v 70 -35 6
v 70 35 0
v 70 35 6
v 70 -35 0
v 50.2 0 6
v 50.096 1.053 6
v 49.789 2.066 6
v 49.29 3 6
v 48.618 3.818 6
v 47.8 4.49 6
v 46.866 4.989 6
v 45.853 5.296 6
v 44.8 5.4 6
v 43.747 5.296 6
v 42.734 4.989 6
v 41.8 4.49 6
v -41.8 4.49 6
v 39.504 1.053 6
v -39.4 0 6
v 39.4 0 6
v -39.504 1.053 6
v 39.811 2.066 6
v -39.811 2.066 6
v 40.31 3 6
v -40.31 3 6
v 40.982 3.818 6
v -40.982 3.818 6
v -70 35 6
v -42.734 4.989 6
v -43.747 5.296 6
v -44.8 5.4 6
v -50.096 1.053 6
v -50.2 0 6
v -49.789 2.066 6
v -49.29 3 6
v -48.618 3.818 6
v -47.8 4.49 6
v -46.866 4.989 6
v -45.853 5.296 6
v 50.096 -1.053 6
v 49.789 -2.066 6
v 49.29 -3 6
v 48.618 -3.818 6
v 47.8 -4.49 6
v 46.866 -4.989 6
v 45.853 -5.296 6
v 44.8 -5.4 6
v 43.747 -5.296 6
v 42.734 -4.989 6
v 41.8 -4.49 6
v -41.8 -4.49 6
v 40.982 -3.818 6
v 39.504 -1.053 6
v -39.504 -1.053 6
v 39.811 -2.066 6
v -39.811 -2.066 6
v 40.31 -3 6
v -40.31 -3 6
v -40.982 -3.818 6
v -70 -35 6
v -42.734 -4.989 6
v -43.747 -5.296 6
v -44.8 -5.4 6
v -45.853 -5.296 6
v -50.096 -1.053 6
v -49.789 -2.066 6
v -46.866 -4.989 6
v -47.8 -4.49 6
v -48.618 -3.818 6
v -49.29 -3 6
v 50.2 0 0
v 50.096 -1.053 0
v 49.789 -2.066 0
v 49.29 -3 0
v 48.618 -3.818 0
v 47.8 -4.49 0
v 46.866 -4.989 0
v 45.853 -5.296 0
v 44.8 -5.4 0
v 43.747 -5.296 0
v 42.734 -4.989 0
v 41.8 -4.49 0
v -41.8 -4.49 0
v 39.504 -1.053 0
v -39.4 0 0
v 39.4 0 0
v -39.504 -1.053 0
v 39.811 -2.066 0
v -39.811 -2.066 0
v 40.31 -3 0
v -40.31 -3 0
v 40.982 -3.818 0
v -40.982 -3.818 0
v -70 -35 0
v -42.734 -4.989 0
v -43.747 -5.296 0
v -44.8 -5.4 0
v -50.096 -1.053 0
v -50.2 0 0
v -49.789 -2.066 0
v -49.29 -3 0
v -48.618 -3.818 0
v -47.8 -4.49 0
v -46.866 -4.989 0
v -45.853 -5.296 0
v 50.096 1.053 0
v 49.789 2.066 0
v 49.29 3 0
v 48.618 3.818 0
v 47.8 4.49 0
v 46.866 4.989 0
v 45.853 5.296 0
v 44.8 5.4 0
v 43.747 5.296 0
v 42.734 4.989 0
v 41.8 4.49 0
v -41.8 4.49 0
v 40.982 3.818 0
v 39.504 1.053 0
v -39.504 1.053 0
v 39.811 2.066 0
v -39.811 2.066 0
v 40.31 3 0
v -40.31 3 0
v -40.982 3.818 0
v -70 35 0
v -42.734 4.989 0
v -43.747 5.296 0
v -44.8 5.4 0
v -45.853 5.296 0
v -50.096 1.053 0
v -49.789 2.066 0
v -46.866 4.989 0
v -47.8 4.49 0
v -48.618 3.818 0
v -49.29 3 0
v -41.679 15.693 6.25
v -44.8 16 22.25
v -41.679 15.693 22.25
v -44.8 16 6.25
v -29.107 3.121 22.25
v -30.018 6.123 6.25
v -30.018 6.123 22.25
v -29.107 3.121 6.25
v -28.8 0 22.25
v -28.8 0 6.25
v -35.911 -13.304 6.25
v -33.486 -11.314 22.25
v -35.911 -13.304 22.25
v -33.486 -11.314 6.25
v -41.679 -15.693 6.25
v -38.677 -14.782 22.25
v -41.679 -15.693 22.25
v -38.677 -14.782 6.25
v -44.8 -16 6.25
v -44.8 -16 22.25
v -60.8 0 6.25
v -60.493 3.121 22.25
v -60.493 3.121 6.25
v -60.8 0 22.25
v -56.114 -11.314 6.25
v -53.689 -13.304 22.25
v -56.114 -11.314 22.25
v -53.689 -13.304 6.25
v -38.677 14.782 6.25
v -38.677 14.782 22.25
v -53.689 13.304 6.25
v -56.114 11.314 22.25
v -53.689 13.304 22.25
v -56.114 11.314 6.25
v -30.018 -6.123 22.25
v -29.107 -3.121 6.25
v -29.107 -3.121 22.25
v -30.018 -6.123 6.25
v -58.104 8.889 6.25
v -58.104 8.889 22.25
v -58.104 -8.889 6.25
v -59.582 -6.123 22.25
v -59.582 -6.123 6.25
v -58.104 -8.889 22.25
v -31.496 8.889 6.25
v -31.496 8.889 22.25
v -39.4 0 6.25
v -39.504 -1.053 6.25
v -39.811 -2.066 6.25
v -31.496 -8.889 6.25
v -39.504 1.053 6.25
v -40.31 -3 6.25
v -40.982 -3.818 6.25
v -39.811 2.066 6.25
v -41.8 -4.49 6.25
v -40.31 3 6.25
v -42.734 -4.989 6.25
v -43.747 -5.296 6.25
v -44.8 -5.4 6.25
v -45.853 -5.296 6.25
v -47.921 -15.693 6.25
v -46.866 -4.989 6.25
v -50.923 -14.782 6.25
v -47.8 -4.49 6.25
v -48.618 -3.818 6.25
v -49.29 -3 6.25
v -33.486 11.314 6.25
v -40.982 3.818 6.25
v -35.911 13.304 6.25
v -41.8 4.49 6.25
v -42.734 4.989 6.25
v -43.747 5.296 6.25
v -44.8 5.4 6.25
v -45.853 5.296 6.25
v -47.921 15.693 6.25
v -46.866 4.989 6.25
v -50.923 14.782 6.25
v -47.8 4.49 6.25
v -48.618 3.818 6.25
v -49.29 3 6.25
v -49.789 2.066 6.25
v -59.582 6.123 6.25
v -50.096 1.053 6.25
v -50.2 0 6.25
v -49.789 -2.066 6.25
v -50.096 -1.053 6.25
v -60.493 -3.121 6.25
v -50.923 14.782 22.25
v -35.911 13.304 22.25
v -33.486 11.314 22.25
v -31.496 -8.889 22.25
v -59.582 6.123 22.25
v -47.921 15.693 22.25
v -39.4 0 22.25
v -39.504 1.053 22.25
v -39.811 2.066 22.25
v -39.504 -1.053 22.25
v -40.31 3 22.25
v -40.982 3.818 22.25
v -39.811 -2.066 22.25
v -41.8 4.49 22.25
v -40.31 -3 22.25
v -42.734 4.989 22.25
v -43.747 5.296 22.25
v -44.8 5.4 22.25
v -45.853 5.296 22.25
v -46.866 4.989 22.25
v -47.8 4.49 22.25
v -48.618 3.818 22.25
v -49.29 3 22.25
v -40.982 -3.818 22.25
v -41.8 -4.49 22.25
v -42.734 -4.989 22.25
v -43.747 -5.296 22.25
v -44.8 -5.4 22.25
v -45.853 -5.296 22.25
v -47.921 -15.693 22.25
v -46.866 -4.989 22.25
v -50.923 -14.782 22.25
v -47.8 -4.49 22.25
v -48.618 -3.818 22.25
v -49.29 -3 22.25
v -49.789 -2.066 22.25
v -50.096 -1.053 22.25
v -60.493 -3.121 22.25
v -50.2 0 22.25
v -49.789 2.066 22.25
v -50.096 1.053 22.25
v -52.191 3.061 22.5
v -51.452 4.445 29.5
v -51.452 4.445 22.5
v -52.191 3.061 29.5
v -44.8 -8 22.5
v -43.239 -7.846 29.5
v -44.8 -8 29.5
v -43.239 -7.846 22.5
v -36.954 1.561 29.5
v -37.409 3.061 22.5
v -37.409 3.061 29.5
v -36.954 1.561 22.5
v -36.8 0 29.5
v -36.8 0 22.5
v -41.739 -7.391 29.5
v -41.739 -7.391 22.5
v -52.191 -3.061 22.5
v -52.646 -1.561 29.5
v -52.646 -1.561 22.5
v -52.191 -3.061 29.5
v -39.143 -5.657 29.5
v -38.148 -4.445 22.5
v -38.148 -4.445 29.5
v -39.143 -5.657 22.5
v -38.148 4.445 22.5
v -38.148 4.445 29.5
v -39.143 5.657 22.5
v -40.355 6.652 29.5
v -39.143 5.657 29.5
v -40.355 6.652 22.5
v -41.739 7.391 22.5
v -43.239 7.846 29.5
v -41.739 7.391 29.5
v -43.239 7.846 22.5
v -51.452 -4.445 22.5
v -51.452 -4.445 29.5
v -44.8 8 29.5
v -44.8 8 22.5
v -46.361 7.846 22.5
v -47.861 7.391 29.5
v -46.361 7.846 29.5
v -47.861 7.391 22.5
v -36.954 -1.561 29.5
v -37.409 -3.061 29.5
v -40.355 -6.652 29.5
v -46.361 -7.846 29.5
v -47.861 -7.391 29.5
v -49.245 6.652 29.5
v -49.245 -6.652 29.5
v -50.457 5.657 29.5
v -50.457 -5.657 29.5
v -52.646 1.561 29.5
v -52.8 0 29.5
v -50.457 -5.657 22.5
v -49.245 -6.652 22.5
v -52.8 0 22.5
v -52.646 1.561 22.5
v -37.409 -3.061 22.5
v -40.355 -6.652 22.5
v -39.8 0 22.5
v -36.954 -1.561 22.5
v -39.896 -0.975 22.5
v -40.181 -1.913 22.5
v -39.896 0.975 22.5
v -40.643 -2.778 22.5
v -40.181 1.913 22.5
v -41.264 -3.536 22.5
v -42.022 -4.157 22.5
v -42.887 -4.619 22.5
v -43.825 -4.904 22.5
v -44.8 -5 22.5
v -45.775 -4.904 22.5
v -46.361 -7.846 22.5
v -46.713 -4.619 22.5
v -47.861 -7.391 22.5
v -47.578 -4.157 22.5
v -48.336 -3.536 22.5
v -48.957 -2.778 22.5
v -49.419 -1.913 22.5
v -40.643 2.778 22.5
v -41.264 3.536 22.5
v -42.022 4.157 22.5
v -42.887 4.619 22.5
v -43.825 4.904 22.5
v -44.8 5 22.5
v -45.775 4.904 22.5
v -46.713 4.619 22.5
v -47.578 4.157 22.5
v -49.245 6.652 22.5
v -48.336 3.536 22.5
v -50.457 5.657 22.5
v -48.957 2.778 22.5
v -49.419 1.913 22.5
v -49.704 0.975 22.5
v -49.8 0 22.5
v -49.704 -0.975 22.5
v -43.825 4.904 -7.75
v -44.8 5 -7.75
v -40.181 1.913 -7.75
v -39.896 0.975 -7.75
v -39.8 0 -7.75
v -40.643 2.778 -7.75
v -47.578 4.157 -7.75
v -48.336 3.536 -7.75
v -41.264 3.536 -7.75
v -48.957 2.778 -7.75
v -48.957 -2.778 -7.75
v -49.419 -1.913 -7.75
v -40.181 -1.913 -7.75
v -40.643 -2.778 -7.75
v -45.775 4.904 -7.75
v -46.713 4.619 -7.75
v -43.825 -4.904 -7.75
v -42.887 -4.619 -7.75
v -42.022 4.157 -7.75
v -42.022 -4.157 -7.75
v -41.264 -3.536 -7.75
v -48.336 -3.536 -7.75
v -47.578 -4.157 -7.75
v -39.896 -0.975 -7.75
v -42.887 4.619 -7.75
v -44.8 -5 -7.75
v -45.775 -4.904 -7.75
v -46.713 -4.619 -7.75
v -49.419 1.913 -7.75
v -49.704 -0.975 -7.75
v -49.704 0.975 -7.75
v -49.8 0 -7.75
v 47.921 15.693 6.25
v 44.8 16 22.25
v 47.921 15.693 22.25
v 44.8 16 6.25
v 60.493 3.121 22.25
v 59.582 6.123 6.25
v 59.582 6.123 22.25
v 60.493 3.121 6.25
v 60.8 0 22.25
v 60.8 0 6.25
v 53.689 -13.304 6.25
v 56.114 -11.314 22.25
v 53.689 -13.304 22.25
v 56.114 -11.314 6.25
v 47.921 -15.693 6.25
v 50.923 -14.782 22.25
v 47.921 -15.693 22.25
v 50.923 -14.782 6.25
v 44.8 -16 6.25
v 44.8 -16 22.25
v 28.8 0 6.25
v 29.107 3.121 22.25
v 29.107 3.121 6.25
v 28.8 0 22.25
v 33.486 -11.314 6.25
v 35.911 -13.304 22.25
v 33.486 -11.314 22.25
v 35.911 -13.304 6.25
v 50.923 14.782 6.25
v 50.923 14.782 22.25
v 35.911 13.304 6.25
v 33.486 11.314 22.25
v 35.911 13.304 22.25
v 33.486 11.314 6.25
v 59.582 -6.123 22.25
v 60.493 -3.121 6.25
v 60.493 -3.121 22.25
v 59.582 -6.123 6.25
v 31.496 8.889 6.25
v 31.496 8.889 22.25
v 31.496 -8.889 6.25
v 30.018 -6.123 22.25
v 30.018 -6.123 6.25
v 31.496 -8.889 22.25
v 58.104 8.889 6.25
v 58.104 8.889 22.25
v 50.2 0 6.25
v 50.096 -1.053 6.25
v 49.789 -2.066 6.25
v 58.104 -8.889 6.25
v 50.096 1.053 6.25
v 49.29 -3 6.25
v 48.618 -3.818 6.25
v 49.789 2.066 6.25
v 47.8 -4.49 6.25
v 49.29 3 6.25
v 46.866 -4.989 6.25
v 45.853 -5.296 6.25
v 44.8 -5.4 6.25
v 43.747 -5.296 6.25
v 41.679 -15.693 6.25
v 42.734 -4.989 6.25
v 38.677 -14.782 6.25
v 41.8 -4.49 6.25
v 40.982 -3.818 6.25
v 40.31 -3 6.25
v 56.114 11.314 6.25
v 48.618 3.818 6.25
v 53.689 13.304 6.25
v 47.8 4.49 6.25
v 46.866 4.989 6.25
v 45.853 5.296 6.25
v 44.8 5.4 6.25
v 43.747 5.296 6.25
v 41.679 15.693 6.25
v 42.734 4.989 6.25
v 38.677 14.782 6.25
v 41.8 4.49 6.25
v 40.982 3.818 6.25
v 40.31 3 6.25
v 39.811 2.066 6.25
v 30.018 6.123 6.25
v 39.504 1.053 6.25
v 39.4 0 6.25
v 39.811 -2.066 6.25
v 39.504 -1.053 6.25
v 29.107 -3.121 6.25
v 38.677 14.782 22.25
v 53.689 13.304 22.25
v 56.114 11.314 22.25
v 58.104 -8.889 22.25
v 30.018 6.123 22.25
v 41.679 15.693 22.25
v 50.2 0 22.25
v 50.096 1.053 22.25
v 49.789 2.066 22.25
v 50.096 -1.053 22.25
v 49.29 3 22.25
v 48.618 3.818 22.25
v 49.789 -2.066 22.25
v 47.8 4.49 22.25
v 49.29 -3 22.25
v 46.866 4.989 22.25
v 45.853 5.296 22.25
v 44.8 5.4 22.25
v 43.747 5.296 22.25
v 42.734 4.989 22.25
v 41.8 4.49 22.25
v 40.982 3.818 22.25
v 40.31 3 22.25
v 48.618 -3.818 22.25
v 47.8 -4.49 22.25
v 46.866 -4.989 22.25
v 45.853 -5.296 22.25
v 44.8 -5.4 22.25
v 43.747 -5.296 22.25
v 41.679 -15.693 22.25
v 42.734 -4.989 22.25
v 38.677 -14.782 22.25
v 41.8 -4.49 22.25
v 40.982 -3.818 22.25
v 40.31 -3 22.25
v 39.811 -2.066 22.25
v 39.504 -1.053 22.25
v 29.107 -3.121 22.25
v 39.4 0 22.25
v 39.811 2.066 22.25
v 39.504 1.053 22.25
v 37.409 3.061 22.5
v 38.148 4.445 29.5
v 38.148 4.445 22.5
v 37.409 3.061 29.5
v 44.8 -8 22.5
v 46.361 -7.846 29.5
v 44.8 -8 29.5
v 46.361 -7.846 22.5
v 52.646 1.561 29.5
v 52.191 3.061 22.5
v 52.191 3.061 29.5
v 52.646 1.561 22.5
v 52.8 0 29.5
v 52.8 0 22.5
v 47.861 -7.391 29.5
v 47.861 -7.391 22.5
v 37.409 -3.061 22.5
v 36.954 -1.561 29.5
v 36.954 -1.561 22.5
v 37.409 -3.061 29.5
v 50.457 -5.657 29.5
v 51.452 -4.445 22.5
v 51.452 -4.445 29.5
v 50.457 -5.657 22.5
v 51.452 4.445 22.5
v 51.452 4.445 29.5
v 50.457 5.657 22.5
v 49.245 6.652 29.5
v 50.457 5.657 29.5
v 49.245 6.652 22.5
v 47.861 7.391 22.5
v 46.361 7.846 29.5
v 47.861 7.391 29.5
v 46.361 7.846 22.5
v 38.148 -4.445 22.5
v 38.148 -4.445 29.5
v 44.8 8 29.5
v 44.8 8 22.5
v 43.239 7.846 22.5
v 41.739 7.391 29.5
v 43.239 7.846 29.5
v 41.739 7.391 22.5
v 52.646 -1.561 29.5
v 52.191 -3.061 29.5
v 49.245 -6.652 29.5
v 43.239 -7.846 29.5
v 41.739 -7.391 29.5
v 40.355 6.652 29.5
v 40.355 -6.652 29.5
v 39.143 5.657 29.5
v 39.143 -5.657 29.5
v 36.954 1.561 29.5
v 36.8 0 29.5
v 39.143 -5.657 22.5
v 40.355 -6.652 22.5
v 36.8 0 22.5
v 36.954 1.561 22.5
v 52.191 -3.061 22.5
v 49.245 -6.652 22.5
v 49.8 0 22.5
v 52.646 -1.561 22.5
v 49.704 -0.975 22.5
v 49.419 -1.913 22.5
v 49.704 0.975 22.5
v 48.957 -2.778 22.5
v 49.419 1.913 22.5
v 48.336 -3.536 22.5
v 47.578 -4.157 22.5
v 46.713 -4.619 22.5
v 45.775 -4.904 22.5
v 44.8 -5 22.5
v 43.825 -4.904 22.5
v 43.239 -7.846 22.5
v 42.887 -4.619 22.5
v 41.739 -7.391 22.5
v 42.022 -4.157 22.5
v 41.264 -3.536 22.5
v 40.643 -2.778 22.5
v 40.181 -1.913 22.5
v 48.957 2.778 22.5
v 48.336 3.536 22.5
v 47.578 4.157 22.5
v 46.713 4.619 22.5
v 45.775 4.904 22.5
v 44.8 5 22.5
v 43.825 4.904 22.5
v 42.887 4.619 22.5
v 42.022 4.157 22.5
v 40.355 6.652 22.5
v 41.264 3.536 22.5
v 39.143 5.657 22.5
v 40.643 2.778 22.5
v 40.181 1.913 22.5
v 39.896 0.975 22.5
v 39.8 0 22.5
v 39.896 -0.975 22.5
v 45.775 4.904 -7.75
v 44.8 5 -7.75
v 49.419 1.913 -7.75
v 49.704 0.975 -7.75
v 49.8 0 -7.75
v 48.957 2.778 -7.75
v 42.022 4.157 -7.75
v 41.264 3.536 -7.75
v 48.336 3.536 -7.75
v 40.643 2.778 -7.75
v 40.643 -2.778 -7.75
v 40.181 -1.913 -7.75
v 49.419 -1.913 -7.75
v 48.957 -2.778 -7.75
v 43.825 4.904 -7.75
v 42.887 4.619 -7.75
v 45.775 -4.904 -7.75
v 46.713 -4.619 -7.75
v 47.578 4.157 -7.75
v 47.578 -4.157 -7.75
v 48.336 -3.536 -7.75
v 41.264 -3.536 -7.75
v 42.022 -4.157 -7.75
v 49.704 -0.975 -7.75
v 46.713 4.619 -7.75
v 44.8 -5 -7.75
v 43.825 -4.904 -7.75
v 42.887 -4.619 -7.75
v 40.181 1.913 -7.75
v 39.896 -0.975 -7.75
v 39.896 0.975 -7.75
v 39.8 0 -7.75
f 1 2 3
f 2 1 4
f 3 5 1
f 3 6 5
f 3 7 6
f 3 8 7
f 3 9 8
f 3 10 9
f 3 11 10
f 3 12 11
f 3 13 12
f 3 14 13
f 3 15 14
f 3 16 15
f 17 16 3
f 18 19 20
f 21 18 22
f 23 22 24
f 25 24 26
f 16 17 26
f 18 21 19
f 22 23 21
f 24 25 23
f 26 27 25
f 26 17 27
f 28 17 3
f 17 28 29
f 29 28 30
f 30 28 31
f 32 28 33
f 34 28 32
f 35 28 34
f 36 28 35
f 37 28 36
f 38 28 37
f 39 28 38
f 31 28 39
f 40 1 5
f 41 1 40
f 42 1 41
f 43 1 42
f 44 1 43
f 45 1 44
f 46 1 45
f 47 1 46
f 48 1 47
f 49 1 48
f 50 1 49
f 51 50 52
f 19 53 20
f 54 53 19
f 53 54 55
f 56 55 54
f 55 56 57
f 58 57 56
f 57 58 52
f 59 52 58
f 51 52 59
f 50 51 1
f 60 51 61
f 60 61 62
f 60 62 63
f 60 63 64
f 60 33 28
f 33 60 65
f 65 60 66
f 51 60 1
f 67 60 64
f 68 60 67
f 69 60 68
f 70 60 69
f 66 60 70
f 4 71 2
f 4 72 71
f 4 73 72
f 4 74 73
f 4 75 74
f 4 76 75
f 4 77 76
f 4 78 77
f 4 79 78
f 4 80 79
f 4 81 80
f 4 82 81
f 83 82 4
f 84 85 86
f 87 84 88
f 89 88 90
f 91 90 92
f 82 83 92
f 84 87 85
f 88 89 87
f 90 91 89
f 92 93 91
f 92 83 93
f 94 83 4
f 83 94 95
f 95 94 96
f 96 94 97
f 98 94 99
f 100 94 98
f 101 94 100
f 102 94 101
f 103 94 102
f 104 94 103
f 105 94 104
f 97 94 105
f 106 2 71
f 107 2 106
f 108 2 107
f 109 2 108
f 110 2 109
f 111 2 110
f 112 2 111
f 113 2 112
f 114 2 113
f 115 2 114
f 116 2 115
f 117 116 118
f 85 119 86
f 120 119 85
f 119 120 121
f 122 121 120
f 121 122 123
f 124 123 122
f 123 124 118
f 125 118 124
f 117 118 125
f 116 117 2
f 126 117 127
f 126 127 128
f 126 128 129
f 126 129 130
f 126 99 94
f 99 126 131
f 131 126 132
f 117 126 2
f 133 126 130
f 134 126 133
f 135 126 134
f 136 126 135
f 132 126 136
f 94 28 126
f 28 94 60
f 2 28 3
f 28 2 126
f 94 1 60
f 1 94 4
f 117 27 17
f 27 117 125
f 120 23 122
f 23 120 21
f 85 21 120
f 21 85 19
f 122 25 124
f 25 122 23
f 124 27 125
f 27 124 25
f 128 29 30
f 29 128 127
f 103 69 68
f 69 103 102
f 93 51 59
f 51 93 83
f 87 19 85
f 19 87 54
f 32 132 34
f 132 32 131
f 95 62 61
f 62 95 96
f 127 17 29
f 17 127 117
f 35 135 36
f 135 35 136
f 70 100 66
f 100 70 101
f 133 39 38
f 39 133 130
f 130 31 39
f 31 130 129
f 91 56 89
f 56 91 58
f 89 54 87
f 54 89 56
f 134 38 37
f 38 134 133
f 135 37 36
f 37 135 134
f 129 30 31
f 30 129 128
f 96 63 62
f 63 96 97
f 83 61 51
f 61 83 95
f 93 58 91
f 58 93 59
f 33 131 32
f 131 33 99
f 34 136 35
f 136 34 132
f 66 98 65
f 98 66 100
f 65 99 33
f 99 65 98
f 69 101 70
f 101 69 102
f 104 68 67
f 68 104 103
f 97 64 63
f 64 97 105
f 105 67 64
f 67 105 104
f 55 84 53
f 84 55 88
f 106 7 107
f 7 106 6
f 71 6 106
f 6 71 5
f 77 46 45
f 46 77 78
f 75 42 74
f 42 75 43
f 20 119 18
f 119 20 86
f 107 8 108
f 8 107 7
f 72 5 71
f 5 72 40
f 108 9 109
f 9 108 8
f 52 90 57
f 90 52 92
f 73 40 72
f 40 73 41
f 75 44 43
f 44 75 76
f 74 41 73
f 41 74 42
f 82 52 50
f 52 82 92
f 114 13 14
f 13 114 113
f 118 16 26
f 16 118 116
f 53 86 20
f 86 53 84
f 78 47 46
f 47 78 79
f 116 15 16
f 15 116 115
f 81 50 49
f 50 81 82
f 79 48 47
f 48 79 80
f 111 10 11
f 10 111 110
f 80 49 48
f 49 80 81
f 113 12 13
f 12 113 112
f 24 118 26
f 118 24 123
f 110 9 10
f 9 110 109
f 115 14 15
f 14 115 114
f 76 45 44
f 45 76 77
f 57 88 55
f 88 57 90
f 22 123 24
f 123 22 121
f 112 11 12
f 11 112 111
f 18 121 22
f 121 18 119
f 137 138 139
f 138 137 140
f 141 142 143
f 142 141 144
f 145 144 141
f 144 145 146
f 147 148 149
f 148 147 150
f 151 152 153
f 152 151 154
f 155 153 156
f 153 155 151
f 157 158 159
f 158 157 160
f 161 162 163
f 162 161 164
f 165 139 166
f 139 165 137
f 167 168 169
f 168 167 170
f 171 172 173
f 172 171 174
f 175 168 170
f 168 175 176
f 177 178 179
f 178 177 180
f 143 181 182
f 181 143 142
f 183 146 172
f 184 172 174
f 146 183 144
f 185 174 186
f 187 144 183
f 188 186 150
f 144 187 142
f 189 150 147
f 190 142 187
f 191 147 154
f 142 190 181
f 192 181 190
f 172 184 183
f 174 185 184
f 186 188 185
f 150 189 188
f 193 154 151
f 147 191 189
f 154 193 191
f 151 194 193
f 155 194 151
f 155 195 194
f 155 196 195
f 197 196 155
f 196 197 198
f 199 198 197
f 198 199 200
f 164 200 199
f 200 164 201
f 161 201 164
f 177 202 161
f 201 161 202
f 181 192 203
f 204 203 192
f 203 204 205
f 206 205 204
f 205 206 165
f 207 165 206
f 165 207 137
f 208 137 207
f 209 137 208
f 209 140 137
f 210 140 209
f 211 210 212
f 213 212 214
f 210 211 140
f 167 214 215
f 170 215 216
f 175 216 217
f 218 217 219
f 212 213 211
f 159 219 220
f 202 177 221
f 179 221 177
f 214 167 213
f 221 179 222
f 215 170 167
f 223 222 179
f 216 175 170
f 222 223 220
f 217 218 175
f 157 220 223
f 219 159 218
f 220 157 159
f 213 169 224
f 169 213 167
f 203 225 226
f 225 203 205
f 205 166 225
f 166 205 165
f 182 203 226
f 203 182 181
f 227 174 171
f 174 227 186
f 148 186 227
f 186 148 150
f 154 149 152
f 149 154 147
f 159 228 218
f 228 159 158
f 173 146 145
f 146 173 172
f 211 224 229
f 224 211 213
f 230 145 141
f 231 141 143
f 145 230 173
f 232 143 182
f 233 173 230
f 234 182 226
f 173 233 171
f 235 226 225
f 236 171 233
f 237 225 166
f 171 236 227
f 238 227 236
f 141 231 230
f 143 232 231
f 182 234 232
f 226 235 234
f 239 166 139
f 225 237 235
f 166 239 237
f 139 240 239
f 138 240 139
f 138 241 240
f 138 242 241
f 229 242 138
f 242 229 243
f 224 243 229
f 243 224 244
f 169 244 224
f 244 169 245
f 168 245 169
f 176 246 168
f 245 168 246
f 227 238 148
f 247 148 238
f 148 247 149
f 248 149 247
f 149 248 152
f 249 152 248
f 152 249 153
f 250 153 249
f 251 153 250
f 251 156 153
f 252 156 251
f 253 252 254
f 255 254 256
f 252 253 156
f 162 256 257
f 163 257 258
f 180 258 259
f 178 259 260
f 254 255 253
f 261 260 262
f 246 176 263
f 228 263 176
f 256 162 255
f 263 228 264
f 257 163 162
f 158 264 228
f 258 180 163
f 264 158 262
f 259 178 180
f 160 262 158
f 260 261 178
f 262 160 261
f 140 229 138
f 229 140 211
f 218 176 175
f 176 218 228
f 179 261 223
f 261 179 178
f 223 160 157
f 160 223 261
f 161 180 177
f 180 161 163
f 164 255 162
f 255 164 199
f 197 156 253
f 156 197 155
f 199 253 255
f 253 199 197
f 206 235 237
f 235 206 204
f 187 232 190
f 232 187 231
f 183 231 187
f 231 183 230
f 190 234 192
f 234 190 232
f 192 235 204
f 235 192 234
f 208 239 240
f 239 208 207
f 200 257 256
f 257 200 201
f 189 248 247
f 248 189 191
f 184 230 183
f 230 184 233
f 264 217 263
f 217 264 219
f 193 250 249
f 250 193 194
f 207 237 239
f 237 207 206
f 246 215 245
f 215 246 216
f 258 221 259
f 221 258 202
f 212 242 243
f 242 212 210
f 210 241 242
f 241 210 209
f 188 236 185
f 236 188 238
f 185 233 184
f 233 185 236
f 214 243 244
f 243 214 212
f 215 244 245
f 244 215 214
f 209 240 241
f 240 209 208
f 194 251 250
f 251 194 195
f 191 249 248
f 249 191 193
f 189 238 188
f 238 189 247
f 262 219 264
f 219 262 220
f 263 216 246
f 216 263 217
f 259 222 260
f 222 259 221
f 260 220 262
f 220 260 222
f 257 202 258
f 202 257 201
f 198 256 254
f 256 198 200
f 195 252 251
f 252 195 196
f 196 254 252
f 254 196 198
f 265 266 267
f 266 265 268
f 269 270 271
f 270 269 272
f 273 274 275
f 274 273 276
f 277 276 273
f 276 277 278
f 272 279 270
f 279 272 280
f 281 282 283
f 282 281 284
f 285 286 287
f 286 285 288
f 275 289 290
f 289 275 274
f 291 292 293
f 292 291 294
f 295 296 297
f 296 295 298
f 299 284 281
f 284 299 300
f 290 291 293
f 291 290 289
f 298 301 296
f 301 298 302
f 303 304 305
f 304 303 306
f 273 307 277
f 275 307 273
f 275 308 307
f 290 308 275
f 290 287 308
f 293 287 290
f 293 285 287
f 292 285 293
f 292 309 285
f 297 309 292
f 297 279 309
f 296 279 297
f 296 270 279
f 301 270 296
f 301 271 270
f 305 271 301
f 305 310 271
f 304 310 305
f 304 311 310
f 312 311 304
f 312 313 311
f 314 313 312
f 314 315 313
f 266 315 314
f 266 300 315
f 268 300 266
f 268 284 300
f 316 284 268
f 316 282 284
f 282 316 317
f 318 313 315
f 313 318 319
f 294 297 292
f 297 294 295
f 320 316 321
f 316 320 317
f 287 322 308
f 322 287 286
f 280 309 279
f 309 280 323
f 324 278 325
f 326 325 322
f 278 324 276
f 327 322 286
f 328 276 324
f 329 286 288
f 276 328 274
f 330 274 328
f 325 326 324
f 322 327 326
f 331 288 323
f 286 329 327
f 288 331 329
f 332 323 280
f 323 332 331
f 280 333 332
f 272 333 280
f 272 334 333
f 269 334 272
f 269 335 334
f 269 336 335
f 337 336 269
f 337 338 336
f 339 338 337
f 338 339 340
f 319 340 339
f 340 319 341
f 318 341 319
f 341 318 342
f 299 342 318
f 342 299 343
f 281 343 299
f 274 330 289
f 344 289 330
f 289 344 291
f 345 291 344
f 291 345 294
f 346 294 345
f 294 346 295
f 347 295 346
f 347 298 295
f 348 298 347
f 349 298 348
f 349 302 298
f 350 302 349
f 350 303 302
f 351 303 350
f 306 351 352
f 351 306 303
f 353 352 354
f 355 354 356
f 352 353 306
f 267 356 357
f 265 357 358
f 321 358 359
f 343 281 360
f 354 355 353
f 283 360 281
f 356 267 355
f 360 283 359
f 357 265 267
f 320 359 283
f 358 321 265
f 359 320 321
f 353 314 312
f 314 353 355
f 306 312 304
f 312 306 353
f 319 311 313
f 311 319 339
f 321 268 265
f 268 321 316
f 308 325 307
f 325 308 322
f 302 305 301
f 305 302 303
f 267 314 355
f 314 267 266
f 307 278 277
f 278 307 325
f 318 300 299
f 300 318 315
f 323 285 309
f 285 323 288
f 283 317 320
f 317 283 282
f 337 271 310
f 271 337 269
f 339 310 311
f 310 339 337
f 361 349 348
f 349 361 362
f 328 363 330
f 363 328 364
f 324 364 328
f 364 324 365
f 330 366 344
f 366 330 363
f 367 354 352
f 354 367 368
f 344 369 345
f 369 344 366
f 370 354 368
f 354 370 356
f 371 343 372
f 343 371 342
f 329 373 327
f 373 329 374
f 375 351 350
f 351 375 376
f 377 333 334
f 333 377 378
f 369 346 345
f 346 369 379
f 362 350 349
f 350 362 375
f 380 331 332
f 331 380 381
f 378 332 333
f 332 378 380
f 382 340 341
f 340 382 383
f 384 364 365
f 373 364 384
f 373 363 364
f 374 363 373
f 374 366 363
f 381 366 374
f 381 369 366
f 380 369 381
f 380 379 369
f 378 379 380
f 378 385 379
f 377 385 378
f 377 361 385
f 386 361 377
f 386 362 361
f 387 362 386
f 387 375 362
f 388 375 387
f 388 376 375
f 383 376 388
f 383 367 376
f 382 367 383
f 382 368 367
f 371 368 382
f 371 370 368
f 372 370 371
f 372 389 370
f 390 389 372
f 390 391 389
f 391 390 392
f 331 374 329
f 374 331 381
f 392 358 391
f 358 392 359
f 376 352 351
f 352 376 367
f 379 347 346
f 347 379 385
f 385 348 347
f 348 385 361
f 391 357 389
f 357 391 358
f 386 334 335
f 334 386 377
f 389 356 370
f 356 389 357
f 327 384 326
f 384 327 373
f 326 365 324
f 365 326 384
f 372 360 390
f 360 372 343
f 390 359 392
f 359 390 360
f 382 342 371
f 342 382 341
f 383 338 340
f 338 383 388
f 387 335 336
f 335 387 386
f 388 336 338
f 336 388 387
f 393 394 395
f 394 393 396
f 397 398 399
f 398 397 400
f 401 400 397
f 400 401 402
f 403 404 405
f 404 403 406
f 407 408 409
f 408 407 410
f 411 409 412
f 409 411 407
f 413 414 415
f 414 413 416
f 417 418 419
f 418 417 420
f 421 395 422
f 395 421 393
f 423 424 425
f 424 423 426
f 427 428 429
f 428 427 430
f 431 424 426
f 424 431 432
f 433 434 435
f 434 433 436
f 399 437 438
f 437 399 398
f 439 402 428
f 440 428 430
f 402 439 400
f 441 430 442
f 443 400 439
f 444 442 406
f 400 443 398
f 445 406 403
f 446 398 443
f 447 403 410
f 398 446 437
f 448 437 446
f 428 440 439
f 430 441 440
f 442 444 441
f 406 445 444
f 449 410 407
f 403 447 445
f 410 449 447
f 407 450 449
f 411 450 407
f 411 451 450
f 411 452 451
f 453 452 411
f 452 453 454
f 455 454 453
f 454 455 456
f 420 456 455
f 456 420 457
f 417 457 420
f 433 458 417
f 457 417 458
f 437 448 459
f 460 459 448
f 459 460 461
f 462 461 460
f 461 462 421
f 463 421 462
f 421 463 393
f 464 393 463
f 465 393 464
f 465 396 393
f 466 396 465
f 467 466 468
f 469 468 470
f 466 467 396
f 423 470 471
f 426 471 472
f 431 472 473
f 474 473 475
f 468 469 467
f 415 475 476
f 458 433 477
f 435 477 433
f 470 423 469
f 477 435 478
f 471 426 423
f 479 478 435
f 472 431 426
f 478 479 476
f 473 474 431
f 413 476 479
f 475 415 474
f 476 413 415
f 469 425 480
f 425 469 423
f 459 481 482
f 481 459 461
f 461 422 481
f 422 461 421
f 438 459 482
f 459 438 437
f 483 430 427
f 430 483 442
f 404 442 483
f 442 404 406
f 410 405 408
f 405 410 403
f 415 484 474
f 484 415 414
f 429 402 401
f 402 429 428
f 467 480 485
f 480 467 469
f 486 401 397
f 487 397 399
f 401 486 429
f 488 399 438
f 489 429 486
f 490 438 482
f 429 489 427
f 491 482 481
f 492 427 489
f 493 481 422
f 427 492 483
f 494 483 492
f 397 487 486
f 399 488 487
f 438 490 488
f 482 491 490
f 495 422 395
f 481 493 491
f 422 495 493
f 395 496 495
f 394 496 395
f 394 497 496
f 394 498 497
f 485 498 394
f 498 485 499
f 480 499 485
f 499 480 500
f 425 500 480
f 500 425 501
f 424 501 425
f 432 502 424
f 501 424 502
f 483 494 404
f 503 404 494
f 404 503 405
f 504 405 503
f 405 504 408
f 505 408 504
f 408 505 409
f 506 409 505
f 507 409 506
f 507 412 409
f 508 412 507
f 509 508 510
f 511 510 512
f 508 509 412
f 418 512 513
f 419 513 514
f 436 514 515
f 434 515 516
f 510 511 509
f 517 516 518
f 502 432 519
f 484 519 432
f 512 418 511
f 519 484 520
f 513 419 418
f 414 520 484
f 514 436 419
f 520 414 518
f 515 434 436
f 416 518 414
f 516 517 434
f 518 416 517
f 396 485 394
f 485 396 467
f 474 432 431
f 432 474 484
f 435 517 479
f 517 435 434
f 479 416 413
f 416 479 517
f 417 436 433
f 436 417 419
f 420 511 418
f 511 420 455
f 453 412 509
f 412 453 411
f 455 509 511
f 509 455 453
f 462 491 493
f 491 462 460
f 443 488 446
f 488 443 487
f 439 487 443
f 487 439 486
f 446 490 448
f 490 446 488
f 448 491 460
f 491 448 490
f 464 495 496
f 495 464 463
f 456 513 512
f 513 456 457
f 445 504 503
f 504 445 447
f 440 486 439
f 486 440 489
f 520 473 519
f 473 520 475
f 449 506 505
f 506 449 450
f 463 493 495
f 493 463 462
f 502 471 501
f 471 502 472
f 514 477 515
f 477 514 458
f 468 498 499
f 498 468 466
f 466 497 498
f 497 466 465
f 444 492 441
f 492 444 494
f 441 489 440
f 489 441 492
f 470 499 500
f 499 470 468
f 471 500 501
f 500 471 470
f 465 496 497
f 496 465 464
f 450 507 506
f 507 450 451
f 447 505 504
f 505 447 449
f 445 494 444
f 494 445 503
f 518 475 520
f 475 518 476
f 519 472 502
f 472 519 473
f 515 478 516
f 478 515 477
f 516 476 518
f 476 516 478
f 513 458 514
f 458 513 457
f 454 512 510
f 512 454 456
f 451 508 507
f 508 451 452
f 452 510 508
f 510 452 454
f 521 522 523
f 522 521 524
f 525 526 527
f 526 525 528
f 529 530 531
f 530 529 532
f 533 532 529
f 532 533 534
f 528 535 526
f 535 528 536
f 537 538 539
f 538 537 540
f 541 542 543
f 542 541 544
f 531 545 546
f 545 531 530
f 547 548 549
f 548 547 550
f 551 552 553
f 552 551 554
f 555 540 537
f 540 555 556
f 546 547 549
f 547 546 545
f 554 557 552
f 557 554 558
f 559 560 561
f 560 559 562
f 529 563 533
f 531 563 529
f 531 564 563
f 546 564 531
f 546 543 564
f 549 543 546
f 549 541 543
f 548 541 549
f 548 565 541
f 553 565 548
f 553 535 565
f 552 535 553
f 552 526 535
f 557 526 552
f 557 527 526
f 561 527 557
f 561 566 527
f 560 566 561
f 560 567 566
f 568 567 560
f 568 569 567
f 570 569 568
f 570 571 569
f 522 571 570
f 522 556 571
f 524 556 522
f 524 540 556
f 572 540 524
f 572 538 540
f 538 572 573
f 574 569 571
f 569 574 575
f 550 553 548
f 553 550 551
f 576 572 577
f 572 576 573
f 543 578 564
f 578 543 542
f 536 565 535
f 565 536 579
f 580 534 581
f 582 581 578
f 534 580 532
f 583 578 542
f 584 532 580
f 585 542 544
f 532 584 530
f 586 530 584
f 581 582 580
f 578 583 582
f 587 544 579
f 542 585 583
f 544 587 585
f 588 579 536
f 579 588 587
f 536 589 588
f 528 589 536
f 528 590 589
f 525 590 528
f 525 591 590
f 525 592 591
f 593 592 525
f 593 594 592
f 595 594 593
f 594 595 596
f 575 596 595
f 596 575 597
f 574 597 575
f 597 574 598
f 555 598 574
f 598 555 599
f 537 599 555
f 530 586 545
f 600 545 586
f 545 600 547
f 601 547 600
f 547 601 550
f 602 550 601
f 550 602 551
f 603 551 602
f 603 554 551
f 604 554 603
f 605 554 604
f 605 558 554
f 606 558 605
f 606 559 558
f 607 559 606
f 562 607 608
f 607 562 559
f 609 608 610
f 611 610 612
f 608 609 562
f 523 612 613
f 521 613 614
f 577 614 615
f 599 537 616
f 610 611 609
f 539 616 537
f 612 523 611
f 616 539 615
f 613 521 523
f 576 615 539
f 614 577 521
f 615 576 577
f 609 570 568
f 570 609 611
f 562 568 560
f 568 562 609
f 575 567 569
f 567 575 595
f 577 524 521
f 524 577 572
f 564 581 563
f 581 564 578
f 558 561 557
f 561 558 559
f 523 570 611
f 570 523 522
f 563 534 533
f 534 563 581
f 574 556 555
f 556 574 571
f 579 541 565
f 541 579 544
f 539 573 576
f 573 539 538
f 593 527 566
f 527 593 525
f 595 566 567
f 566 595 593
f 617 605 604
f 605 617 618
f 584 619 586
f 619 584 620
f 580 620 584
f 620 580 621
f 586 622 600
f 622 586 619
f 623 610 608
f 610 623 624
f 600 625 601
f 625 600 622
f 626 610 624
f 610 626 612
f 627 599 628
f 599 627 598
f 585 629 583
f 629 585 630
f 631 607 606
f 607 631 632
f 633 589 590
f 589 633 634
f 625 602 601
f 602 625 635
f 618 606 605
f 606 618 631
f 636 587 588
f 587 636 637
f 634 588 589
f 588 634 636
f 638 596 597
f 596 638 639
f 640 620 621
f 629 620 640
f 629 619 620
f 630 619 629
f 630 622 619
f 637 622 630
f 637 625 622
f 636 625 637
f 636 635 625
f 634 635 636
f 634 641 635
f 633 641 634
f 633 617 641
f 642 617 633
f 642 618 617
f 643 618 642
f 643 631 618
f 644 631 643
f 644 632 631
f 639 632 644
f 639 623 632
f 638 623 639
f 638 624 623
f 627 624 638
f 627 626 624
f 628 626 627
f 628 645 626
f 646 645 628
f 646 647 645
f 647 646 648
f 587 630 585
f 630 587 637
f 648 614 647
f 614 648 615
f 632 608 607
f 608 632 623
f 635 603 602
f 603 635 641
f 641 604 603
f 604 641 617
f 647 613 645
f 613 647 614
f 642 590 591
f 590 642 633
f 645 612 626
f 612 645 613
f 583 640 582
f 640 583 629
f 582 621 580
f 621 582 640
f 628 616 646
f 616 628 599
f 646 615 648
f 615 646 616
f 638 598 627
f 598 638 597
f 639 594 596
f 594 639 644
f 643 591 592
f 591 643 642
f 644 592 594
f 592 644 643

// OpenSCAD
$fn = 32;

// ------------------------------------------------------------------------
// Standoff columns: 2 d32 standoffs, bolts d10
// Every part is its own module, assembly() places them once.
// ------------------------------------------------------------------------

// --- part 1 ---
module base_plate() {
  difference() {
    translate([-70, -35, 0]) cube([140, 70, 6]);
    translate([-44.8, 0, -1]) cylinder(h = 8, d = 10.8);
    translate([44.8, 0, -1]) cylinder(h = 8, d = 10.8);
  }
}

// --- part 2 ---
module spacer1() {
  difference() {
      translate([0, 0, 0]) cylinder(h = 16, d = 32);
      translate([0, 0, -1]) cylinder(h = 18, d = 10.8);
    }
}

// --- part 3 ---
module bolt1() {
  cylinder(h = 7, d = 16);
  translate([0, 0, -30.25]) cylinder(h = 30.25, d = 10);
}

// --- part 4 ---
module spacer2() {
  difference() {
      translate([0, 0, 0]) cylinder(h = 16, d = 32);
      translate([0, 0, -1]) cylinder(h = 18, d = 10.8);
    }
}

// --- part 5 ---
module bolt2() {
  cylinder(h = 7, d = 16);
  translate([0, 0, -30.25]) cylinder(h = 30.25, d = 10);
}

// --- assembly ---
module assembly() {
  translate([0, 0, 0]) rotate([0, 0, 0]) base_plate();
  translate([-44.8, 0, 6.25]) rotate([0, 0, 0]) spacer1();
  translate([-44.8, 0, 22.5]) rotate([0, 0, 0]) bolt1();
  translate([44.8, 0, 6.25]) rotate([0, 0, 0]) spacer2();
  translate([44.8, 0, 22.5]) rotate([0, 0, 0]) bolt2();
}

assembly();
